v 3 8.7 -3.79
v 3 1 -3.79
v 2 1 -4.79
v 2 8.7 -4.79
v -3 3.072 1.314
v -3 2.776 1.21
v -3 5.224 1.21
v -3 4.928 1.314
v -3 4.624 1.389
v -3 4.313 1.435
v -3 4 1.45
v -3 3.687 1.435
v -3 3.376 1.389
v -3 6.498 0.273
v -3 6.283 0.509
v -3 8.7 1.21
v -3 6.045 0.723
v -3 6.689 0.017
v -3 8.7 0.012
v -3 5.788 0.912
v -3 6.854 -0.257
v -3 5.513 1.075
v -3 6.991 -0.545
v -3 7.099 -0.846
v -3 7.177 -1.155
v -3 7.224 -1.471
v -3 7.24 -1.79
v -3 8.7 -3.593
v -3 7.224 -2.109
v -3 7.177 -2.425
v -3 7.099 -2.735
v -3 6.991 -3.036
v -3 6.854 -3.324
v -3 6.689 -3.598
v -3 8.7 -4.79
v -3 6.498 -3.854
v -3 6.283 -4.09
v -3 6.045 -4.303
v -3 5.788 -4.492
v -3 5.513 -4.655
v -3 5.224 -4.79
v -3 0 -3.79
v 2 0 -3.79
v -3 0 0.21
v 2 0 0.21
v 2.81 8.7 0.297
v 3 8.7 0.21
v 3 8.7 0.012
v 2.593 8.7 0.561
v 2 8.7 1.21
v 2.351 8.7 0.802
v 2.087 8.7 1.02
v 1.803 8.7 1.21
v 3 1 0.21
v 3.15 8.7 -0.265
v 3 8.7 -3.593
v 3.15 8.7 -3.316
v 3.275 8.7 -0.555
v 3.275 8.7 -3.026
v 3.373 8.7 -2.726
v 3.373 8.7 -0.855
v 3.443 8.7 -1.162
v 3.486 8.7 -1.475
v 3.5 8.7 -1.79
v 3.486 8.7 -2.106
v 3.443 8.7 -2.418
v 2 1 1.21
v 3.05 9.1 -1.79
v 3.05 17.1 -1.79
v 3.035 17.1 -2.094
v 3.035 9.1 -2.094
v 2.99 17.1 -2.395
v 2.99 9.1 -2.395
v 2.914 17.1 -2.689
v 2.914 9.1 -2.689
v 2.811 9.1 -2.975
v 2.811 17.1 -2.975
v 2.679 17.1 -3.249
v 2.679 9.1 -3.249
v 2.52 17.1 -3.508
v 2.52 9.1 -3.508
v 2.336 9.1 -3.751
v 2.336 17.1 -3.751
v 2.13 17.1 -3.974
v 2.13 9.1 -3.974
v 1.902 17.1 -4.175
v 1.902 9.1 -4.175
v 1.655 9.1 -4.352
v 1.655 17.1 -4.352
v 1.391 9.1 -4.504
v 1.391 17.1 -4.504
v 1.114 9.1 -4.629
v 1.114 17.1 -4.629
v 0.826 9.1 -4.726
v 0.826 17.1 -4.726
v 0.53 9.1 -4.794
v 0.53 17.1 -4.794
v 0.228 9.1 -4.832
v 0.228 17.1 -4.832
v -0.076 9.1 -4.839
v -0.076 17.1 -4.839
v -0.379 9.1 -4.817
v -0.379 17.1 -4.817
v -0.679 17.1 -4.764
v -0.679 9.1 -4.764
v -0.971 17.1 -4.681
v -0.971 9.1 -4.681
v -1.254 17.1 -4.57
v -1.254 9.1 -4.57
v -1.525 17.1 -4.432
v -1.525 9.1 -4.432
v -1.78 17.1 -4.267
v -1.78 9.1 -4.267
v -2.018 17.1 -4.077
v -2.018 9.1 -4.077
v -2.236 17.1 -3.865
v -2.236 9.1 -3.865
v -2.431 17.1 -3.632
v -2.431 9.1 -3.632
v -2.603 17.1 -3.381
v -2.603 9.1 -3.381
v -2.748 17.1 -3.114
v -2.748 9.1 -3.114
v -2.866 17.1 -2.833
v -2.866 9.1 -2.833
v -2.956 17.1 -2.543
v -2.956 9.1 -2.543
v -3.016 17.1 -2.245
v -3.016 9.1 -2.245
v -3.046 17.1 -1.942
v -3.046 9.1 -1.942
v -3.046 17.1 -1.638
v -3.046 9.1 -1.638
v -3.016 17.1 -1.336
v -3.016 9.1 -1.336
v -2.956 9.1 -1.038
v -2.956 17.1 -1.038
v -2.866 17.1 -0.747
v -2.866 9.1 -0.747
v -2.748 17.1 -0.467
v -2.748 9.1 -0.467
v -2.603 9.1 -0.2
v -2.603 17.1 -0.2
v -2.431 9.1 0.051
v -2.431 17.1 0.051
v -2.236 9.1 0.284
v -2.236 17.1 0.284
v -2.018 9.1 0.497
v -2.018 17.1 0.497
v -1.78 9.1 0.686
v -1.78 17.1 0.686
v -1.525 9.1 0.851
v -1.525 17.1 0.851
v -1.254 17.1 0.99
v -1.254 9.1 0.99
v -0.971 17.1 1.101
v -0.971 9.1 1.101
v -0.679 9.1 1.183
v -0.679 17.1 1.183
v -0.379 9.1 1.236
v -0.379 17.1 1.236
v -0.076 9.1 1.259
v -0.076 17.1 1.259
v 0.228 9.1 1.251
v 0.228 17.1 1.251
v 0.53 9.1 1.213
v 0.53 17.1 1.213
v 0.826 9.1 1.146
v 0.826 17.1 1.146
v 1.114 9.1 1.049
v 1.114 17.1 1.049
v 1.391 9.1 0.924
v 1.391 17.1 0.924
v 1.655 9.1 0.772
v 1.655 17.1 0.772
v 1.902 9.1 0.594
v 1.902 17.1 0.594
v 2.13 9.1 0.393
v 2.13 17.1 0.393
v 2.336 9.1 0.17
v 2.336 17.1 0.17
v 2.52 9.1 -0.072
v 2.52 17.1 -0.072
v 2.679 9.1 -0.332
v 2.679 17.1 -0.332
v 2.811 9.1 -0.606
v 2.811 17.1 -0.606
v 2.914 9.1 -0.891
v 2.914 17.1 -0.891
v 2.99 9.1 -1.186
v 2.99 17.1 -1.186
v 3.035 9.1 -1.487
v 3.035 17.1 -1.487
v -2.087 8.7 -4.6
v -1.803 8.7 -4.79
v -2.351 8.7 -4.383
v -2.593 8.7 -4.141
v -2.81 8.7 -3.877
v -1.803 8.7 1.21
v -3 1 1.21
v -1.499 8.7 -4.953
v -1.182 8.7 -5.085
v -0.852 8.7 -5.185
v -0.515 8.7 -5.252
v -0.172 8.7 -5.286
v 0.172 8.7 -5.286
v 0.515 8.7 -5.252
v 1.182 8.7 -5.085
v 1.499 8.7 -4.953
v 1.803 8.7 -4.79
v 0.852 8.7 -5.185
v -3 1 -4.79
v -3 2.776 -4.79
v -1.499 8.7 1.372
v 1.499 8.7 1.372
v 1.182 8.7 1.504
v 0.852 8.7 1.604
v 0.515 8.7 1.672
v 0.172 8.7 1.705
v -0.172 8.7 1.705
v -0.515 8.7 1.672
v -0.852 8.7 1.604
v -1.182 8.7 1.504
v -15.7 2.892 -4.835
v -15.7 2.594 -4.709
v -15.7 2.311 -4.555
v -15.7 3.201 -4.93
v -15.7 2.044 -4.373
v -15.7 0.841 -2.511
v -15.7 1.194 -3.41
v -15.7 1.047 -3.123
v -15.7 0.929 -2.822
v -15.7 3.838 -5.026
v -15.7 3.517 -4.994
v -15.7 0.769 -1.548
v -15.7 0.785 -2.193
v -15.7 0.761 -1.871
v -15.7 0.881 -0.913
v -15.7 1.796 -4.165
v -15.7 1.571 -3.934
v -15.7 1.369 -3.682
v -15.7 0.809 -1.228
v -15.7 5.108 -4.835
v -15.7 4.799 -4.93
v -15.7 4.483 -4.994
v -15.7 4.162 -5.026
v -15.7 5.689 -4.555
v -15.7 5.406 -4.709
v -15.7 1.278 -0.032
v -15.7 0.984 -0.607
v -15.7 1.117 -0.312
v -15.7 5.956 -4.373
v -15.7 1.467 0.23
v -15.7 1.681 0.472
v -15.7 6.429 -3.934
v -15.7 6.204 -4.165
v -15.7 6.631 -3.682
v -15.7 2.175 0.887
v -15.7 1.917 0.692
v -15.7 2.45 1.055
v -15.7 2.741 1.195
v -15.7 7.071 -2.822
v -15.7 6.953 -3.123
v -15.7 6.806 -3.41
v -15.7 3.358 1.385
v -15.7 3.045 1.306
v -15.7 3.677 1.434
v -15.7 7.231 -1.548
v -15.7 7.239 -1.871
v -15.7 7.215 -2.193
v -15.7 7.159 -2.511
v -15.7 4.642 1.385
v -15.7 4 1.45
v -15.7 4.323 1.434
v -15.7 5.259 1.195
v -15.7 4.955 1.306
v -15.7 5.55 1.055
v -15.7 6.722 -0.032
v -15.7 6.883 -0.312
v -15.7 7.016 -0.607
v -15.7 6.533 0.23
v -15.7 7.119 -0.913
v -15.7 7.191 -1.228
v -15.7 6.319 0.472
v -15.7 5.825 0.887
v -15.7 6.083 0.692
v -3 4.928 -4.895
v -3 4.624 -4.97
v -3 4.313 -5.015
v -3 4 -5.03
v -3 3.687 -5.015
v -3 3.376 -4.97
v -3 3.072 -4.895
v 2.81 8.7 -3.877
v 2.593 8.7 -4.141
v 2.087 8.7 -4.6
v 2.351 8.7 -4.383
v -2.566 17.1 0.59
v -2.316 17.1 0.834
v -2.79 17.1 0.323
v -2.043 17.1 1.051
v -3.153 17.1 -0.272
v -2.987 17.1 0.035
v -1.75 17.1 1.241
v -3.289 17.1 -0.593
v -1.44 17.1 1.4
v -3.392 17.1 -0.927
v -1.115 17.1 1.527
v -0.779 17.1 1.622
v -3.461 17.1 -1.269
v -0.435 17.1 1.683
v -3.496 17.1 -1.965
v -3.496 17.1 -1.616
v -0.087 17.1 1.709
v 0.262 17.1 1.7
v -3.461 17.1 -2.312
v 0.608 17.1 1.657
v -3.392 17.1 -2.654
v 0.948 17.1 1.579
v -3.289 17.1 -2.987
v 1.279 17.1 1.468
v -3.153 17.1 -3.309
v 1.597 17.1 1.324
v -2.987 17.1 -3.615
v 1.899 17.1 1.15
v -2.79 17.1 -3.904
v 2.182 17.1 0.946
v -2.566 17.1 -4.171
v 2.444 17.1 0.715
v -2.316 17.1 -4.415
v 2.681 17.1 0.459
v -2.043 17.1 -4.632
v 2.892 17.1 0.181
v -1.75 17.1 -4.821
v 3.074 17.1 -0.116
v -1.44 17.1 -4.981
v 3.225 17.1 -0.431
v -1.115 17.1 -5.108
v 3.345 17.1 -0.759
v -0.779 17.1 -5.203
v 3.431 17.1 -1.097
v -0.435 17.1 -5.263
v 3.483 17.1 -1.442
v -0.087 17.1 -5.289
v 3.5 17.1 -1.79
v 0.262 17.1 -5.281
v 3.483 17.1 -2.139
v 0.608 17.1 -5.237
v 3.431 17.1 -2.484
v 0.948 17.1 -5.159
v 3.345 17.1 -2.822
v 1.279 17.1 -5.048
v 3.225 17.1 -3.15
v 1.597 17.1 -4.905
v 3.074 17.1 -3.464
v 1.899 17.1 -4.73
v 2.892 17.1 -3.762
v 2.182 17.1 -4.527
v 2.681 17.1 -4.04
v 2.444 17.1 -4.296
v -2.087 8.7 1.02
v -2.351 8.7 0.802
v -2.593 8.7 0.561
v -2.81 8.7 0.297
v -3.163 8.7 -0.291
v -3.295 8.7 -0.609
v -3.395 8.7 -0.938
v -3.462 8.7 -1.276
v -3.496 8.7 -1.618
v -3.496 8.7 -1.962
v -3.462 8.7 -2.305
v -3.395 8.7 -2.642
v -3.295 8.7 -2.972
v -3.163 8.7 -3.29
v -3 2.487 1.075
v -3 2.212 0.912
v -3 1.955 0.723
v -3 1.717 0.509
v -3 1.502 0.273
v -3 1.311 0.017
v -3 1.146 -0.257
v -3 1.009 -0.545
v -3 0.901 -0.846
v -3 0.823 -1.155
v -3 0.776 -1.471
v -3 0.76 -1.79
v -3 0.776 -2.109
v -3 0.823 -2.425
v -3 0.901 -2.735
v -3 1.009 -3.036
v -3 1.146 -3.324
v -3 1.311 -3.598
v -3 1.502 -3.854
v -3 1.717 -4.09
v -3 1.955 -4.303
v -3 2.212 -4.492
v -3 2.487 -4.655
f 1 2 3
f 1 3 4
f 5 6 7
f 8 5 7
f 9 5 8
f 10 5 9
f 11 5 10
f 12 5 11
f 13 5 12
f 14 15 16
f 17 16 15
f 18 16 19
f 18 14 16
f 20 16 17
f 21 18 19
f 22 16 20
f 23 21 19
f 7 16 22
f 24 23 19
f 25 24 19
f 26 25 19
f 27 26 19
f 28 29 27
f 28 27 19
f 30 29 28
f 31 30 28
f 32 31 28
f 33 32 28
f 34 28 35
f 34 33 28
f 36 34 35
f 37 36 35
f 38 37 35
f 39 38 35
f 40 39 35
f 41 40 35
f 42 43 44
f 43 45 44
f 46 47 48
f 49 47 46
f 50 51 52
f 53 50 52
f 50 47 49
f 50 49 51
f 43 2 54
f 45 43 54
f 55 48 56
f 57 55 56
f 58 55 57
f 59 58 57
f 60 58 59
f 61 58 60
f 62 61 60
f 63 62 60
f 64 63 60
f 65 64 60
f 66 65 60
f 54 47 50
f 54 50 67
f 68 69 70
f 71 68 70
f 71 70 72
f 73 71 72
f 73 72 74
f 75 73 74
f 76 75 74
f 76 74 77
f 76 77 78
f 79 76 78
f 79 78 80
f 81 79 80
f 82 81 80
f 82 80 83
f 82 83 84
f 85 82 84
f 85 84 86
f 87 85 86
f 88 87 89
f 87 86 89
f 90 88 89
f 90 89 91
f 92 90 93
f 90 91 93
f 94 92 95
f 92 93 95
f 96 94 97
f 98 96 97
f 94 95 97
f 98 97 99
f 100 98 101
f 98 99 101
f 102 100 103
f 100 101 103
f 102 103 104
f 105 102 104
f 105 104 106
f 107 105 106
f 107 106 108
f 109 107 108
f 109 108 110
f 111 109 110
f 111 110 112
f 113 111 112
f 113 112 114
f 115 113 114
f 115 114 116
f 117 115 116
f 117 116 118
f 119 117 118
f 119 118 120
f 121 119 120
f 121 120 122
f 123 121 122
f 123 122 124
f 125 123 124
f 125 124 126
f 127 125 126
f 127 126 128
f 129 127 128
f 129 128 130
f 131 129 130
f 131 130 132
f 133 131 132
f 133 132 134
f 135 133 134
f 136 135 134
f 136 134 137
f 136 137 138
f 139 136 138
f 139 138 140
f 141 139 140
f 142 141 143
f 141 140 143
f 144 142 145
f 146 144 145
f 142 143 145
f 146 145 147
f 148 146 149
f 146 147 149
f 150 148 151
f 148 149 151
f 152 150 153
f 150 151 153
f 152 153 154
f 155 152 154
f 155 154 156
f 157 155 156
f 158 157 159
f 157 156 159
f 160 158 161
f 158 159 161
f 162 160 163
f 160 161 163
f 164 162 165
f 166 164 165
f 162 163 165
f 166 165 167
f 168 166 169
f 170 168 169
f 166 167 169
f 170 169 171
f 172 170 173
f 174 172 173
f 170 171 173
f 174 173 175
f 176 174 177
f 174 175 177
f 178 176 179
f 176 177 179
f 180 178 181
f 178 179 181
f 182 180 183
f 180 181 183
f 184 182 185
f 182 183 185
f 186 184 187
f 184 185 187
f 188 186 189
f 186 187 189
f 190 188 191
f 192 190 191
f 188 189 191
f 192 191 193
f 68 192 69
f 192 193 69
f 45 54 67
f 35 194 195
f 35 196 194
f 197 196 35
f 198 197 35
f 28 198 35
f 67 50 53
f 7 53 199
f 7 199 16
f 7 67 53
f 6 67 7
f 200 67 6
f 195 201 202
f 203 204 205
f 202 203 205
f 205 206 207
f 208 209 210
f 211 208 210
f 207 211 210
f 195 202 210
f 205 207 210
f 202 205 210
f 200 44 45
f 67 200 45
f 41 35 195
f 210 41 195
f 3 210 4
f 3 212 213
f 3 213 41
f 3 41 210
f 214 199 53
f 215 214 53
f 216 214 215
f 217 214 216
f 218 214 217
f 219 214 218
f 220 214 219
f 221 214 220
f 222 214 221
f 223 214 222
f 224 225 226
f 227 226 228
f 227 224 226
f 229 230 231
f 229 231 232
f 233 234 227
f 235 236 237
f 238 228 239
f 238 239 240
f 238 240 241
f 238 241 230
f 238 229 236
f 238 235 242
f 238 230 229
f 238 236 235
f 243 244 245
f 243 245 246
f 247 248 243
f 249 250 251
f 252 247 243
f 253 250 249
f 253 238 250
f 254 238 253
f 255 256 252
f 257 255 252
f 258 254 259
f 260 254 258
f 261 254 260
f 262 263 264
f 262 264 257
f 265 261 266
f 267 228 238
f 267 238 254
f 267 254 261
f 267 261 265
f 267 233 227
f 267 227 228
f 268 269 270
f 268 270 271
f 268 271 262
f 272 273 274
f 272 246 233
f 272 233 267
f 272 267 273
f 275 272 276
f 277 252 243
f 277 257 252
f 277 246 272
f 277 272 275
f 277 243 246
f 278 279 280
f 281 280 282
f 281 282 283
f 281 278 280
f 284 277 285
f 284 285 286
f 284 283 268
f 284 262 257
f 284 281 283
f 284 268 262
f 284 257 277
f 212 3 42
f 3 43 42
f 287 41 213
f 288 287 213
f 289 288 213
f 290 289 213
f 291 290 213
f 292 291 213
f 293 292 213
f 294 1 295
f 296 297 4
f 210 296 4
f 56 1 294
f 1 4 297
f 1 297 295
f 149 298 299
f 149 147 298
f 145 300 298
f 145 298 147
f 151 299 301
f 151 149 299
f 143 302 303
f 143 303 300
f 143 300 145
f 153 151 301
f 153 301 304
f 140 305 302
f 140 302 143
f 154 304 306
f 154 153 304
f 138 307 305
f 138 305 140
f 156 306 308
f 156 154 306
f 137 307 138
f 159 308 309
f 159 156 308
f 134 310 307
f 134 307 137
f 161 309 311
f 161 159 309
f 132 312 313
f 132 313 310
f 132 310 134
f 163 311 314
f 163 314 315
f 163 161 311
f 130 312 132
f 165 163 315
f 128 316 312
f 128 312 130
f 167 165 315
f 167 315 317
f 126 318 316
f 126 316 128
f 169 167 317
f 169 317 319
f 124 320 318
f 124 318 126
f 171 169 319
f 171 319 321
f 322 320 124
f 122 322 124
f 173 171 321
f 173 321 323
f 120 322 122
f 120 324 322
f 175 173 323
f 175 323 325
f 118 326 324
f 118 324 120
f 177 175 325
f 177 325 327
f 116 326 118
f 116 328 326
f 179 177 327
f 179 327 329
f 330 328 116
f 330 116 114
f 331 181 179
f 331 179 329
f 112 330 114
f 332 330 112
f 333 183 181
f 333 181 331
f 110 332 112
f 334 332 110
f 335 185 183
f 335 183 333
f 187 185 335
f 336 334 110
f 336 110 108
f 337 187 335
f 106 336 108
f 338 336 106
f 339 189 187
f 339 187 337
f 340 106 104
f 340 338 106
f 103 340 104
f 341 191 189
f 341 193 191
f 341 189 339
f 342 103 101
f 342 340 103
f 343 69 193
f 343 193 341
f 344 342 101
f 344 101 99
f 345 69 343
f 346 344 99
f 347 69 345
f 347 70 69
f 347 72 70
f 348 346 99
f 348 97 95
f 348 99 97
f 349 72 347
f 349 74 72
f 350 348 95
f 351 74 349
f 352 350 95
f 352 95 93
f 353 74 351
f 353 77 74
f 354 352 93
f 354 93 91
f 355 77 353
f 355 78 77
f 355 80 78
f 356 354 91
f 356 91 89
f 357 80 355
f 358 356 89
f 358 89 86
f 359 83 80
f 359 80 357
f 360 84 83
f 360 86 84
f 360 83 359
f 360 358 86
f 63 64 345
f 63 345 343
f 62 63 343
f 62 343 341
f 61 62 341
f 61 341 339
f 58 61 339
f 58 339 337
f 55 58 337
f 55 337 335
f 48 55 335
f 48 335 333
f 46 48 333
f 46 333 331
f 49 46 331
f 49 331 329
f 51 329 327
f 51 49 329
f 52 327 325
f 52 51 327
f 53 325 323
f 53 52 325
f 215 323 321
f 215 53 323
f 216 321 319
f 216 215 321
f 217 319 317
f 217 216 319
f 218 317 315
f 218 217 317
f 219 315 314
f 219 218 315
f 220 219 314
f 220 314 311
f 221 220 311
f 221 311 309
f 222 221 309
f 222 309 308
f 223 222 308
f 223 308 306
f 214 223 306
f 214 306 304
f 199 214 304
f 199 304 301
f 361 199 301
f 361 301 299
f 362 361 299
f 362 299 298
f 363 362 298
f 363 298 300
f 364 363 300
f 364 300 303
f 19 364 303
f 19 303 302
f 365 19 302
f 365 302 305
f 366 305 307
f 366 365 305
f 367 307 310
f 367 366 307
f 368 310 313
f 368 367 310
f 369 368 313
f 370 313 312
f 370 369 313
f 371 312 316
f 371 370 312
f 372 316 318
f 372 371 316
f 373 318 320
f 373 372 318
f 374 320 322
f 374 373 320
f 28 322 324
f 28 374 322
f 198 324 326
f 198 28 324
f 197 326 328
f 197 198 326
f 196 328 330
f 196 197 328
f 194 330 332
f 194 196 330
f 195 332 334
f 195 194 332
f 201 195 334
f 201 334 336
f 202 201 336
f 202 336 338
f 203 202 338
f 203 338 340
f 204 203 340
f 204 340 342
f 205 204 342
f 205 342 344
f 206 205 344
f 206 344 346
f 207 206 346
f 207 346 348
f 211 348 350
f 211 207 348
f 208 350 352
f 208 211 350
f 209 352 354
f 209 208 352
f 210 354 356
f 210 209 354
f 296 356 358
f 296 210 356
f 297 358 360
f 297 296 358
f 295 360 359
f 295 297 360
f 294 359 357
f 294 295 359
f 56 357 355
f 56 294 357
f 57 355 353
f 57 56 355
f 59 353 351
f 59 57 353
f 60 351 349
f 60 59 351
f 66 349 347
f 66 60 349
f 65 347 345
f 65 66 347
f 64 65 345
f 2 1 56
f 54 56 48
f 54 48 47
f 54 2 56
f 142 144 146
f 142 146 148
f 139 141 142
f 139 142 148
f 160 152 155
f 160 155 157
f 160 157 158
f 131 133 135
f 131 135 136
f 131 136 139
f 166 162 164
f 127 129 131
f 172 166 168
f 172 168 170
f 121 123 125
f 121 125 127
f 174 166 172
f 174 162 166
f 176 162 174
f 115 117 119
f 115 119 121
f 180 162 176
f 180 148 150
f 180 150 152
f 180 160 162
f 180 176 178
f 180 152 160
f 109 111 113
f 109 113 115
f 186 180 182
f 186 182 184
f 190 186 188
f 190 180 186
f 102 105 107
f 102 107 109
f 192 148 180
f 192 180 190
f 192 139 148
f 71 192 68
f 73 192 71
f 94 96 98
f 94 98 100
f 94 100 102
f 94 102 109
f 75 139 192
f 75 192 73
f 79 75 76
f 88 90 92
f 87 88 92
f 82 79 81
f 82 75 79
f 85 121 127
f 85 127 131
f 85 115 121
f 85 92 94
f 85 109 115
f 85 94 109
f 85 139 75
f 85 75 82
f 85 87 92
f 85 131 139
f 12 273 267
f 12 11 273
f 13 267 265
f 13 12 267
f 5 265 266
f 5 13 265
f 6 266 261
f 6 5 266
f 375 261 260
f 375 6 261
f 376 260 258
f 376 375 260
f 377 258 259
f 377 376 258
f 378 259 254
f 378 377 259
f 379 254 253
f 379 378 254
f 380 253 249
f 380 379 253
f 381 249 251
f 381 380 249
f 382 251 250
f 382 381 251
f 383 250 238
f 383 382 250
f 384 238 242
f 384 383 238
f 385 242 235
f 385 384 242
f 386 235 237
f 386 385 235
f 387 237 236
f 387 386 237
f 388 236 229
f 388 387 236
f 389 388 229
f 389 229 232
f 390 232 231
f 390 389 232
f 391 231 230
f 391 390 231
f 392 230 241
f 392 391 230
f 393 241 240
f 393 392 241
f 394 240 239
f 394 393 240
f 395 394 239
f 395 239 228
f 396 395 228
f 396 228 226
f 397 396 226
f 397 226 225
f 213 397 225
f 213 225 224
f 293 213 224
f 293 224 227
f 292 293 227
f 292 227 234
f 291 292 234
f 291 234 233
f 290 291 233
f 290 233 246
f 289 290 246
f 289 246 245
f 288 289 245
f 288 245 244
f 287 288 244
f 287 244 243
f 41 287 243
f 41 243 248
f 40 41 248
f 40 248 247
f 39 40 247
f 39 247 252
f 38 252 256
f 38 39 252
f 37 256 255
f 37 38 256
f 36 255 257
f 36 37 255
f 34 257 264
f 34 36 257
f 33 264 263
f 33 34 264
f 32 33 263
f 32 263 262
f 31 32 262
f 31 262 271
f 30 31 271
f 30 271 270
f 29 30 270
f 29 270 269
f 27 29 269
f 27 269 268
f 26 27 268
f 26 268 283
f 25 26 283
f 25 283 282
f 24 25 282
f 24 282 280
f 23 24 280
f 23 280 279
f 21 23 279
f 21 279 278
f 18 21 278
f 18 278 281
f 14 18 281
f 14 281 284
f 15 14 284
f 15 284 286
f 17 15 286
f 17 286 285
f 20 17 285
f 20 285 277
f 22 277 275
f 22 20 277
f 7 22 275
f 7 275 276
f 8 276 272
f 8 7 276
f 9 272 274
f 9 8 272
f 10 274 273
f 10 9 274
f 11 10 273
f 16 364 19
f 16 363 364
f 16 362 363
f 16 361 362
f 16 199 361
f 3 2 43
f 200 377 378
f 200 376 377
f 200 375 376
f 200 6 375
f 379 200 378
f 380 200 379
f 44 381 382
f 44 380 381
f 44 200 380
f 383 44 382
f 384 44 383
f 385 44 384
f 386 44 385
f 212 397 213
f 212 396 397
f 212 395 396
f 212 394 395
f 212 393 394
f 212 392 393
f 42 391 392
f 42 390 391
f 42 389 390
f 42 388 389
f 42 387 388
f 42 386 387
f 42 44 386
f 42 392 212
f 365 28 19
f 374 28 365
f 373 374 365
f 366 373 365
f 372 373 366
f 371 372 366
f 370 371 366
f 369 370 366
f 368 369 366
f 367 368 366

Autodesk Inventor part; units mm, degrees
ref_plane "YZ Plane" through (0, 0, 0) normal (1, 0, 0) x (0, 1, 0)
ref_plane "XZ Plane" through (0, 0, 0) normal (0, 1, 0) x (-1, 0, 0)
ref_plane "XY Plane" through (0, 0, 0) normal (0, 0, 1) x (1, 0, 0)
sketch "Sketch1" plane through (0, 0, 0) normal (0, 1, 0) x (-1, 0, 0)
  line L0 (-3, 1.2097) -> (3, 1.2097)
  line L1 (3, 1.2097) -> (3, -4.7903)
  line L2 (3, -4.7903) -> (-3, -4.7903)
  line L3 (-3, -4.7903) -> (-3, 1.2097)
  point P0 (0, 0)
  dimension "d0" = 6
  dimension "d1" = 6
extrude "Extrusion1" add sketch "Sketch1" along normal blind 8.7
sketch "Sketch2" plane through (0, 8.7, 0) normal (0, 1, 0) x (1, 0, 0)
  circle A0 centre (0, 1.7903) radius 3.5
  point P0 (0, 0)
  dimension "d4" = 7
extrude "Extrusion2" add sketch "Sketch2" along normal blind 8.4
sketch "Sketch3" plane through (0, 17.1, -1.7903) normal (0, 1, 0) x (1, 0, 0)
  circle A0 centre (0, 0) radius 3.5 projected
  circle A1 centre (0, 0) radius 3.05
  point P0 (0, -1.7903)
  dimension "d7" = 6.1
extrude "Extrusion3" cut sketch "Sketch3" against normal blind 8 contours A1
sketch "Sketch4" plane through (-3, 0, -4.7903) normal (-1, 0, 0) x (0, 0, 1)
  circle A0 centre (3, 4) radius 3.24
  line L0 (6.5, 17.1) -> (-0.5, 17.1) projected
  point P0 (4.7903, 0)
  dimension "d10" = 6.48
  dimension "d11" = 13.1
extrude "Extrusion4" add sketch "Sketch4" along normal blind 12.7
chamfer "Chamfer1" distance 1 angle 45 5 edges at (3, 4.35, 1.2097) (3, 4.35, -4.7903) (3, 0, -1.7903) (0, 0, 1.2097) (0, 0, -4.7903)
properties part number "SMA_RightAngle"
